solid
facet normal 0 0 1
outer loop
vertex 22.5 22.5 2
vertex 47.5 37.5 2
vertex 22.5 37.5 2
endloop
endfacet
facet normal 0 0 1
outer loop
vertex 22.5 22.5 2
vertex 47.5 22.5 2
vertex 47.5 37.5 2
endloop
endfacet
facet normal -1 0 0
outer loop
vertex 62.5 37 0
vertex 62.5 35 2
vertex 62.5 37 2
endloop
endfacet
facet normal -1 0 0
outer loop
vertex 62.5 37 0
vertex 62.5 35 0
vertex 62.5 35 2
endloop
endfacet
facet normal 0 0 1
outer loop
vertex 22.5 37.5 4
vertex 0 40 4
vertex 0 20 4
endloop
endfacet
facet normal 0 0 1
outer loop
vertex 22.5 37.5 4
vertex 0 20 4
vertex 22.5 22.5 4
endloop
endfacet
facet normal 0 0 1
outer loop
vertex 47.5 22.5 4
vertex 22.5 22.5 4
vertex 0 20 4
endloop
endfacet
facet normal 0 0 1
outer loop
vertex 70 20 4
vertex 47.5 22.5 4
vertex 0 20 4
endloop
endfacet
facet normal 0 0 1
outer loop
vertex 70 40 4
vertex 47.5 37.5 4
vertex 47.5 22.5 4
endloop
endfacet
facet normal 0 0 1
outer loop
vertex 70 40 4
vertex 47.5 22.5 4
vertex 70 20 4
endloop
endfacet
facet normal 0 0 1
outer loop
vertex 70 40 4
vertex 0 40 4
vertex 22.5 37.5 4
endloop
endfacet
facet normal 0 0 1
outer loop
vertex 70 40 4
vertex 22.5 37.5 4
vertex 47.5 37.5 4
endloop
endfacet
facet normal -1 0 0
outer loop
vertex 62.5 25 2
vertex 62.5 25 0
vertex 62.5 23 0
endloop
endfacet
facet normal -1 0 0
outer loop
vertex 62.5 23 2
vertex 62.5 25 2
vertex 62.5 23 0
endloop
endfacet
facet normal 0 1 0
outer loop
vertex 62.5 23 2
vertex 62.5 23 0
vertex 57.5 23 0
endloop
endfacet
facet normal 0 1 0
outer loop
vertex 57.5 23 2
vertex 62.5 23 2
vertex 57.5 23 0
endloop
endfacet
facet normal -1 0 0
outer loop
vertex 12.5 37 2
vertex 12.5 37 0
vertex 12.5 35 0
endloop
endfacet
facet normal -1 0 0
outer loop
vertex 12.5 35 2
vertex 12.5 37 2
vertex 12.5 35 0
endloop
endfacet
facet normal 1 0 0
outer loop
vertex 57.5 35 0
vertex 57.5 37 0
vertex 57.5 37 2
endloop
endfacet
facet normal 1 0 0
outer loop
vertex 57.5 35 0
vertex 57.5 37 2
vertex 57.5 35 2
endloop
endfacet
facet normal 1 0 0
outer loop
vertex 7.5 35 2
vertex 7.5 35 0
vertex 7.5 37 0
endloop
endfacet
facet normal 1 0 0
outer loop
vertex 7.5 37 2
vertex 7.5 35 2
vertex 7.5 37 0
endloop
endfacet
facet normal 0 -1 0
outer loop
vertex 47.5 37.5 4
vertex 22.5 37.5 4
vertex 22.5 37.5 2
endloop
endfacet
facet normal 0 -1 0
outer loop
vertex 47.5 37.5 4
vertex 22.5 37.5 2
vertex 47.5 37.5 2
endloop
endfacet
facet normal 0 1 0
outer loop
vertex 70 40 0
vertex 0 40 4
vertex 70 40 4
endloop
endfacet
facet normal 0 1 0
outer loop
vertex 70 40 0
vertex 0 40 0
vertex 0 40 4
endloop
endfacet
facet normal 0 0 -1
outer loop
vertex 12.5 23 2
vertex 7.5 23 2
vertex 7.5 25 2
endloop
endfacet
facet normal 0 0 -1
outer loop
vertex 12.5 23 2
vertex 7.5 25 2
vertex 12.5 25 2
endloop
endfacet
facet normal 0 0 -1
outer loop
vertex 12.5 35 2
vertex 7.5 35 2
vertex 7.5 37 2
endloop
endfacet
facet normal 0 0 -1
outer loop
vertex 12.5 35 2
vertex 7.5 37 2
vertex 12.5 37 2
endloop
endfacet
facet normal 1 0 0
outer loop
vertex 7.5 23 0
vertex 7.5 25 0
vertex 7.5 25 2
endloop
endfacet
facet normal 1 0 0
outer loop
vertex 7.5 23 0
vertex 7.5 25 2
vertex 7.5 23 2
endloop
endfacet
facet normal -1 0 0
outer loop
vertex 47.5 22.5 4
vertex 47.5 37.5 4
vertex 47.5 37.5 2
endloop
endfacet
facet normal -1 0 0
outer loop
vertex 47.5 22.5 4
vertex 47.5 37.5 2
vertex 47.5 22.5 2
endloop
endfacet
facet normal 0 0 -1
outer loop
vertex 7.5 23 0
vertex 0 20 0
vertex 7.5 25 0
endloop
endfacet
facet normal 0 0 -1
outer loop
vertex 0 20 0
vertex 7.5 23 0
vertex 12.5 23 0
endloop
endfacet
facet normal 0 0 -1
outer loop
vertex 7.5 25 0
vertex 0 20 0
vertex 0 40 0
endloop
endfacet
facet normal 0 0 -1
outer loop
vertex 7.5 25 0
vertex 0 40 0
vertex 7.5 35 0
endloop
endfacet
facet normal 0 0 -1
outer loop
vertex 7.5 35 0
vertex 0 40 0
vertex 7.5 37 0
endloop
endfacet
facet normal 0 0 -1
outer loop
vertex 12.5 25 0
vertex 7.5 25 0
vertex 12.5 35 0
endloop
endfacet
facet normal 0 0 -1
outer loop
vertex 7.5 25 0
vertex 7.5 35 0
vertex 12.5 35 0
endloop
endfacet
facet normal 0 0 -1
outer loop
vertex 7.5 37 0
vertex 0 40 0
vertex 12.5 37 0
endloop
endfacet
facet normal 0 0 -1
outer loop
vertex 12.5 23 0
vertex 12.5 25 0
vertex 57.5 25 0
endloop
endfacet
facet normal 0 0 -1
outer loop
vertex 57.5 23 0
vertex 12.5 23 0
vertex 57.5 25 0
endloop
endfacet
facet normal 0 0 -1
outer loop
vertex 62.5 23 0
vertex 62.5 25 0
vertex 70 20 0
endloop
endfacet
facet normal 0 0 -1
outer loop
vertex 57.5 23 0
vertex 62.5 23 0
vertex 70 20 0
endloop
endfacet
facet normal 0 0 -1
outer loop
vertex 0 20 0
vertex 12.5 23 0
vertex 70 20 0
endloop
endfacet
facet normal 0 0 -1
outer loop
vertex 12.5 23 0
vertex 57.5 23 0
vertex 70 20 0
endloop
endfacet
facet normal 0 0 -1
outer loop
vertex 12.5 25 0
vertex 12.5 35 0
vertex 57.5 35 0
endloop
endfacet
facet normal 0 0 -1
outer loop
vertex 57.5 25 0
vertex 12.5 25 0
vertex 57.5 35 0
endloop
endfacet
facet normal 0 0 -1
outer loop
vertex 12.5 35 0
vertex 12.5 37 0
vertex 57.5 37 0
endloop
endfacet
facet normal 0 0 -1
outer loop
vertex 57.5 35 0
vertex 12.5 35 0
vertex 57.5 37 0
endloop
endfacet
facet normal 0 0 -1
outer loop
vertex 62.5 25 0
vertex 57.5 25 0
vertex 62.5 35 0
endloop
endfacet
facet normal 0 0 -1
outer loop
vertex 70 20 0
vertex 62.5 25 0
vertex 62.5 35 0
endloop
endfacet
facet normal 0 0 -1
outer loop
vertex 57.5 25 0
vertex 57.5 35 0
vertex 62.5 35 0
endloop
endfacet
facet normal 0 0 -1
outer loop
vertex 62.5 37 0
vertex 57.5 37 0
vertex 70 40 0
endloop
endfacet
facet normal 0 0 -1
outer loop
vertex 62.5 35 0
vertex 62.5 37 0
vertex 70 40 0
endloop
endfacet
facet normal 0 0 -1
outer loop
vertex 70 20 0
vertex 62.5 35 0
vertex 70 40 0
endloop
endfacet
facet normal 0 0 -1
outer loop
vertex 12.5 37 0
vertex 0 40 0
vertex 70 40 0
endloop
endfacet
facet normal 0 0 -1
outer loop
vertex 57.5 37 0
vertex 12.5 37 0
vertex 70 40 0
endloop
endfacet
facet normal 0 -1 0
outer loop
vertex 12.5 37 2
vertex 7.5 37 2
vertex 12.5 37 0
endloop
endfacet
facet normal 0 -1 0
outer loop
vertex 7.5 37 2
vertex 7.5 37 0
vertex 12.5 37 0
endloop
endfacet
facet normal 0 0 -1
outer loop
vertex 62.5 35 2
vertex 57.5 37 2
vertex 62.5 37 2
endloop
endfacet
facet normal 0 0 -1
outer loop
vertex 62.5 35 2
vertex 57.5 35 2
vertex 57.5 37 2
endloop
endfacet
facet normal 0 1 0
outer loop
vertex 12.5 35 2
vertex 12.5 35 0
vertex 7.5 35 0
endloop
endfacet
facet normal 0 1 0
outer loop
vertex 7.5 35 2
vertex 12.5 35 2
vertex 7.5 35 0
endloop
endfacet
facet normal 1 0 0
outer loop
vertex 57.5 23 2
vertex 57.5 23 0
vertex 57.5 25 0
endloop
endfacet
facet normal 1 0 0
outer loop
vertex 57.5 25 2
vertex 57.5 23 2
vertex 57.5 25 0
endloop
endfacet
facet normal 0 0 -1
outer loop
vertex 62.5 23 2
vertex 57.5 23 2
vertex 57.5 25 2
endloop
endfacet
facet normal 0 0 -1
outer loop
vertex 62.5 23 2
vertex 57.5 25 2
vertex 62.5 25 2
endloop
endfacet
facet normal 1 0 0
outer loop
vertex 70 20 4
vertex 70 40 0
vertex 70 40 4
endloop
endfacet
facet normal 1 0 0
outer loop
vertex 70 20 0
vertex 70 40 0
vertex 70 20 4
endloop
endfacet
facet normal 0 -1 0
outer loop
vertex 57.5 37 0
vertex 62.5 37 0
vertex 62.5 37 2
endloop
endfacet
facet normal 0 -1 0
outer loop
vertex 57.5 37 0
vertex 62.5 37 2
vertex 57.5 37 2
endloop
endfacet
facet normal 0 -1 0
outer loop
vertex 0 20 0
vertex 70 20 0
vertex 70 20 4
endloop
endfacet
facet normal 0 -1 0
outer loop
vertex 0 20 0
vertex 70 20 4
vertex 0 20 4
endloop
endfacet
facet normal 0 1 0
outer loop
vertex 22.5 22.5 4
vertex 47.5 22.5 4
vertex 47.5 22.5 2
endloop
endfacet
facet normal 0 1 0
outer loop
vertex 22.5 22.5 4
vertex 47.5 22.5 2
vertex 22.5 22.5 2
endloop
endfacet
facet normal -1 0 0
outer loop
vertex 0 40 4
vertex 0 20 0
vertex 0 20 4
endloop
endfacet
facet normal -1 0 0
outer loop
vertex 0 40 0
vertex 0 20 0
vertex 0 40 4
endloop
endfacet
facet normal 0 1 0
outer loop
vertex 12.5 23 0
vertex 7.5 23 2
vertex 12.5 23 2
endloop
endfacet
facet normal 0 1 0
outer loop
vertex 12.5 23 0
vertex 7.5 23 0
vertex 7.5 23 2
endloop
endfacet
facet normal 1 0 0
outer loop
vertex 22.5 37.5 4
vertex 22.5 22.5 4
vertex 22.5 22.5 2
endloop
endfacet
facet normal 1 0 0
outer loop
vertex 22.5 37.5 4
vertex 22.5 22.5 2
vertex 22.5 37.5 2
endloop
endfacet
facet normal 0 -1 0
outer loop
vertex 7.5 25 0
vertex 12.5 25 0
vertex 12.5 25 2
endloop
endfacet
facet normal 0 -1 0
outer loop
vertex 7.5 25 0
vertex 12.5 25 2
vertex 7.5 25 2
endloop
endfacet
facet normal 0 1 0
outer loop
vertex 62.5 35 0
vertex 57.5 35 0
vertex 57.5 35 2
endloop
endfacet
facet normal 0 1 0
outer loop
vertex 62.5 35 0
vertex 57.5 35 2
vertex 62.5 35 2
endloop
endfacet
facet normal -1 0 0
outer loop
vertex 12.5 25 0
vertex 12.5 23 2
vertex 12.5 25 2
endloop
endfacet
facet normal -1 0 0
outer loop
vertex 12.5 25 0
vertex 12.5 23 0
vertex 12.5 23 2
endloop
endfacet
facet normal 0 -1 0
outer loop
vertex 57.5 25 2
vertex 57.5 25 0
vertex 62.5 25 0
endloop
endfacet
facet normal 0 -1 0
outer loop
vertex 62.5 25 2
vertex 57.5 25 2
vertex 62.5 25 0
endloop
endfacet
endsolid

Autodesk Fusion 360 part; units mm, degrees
sketch "Esquisse1" plane through (0, 0, 0) normal (0, 0, 1) x (1, 0, 0)
  line L0 (0, 40) -> (70, 40)
  line L1 (70, 40) -> (70, 20)
  line L2 (70, 20) -> (0, 20)
  line L3 (0, 20) -> (0, 40)
  dimension "d1" = 70
  dimension "d2" = 20
extrude "Extrusion1" add sketch "Esquisse1" along normal blind 4
sketch "Esquisse2" plane through (0, 0, 0) normal (0, 0, -1) x (1, 0, 0)
  line L0 (70, -20) -> (0, -20)
  line L1 (0, -20) -> (0, -40)
  line L2 (0, -40) -> (70, -40)
  line L3 (70, -40) -> (70, -20)
  line L4 (7.5, -23) -> (12.5, -23)
  line L5 (12.5, -23) -> (12.5, -25)
  line L6 (12.5, -25) -> (7.5, -25)
  line L7 (7.5, -25) -> (7.5, -23)
  line L8 (10, -23) -> (10, -25) construction
  line L9 (35, -20) -> (35, -40) construction
  line L10 (57.5, -23) -> (57.5, -25)
  line L11 (62.5, -23) -> (57.5, -23)
  line L12 (62.5, -25) -> (62.5, -23)
  line L13 (57.5, -25) -> (62.5, -25)
  line L14 (0, -30) -> (70, -30) construction
  line L15 (7.5, -37) -> (12.5, -37)
  line L16 (12.5, -37) -> (12.5, -35)
  line L17 (12.5, -35) -> (7.5, -35)
  line L18 (7.5, -35) -> (7.5, -37)
  line L19 (62.5, -37) -> (57.5, -37)
  line L20 (62.5, -35) -> (62.5, -37)
  line L21 (57.5, -35) -> (62.5, -35)
  line L22 (57.5, -37) -> (57.5, -35)
  dimension "d5" = 25
extrude "Extrusion2" cut sketch "Esquisse2" against normal blind 2 contours L4 L5 L6 L7 | L10 L11 L12 L13 | L15 L16 L17 L18 | L19 L20 L21 L22
sketch "Esquisse3" plane through (0, 0, 4) normal (0, 0, 1) x (-1, 0, 0)
  line L0 (0, -20) -> (-70, -20)
  line L1 (-70, -20) -> (-70, -40)
  line L2 (-70, -40) -> (0, -40)
  line L3 (0, -40) -> (0, -20)
  line L4 (-22.5, -37.5) -> (-47.5, -37.5)
  line L5 (-47.5, -37.5) -> (-47.5, -22.5)
  line L6 (-47.5, -22.5) -> (-22.5, -22.5)
  line L7 (-22.5, -22.5) -> (-22.5, -37.5)
  line L8 (0, -30) -> (-70, -30) construction
  line L9 (-35, -40) -> (-35, -20) construction
  dimension "d8" = 25
  dimension "d9" = 15
extrude "Extrusion3" cut sketch "Esquisse3" against normal blind 2 contours L4 L5 L6 L7
